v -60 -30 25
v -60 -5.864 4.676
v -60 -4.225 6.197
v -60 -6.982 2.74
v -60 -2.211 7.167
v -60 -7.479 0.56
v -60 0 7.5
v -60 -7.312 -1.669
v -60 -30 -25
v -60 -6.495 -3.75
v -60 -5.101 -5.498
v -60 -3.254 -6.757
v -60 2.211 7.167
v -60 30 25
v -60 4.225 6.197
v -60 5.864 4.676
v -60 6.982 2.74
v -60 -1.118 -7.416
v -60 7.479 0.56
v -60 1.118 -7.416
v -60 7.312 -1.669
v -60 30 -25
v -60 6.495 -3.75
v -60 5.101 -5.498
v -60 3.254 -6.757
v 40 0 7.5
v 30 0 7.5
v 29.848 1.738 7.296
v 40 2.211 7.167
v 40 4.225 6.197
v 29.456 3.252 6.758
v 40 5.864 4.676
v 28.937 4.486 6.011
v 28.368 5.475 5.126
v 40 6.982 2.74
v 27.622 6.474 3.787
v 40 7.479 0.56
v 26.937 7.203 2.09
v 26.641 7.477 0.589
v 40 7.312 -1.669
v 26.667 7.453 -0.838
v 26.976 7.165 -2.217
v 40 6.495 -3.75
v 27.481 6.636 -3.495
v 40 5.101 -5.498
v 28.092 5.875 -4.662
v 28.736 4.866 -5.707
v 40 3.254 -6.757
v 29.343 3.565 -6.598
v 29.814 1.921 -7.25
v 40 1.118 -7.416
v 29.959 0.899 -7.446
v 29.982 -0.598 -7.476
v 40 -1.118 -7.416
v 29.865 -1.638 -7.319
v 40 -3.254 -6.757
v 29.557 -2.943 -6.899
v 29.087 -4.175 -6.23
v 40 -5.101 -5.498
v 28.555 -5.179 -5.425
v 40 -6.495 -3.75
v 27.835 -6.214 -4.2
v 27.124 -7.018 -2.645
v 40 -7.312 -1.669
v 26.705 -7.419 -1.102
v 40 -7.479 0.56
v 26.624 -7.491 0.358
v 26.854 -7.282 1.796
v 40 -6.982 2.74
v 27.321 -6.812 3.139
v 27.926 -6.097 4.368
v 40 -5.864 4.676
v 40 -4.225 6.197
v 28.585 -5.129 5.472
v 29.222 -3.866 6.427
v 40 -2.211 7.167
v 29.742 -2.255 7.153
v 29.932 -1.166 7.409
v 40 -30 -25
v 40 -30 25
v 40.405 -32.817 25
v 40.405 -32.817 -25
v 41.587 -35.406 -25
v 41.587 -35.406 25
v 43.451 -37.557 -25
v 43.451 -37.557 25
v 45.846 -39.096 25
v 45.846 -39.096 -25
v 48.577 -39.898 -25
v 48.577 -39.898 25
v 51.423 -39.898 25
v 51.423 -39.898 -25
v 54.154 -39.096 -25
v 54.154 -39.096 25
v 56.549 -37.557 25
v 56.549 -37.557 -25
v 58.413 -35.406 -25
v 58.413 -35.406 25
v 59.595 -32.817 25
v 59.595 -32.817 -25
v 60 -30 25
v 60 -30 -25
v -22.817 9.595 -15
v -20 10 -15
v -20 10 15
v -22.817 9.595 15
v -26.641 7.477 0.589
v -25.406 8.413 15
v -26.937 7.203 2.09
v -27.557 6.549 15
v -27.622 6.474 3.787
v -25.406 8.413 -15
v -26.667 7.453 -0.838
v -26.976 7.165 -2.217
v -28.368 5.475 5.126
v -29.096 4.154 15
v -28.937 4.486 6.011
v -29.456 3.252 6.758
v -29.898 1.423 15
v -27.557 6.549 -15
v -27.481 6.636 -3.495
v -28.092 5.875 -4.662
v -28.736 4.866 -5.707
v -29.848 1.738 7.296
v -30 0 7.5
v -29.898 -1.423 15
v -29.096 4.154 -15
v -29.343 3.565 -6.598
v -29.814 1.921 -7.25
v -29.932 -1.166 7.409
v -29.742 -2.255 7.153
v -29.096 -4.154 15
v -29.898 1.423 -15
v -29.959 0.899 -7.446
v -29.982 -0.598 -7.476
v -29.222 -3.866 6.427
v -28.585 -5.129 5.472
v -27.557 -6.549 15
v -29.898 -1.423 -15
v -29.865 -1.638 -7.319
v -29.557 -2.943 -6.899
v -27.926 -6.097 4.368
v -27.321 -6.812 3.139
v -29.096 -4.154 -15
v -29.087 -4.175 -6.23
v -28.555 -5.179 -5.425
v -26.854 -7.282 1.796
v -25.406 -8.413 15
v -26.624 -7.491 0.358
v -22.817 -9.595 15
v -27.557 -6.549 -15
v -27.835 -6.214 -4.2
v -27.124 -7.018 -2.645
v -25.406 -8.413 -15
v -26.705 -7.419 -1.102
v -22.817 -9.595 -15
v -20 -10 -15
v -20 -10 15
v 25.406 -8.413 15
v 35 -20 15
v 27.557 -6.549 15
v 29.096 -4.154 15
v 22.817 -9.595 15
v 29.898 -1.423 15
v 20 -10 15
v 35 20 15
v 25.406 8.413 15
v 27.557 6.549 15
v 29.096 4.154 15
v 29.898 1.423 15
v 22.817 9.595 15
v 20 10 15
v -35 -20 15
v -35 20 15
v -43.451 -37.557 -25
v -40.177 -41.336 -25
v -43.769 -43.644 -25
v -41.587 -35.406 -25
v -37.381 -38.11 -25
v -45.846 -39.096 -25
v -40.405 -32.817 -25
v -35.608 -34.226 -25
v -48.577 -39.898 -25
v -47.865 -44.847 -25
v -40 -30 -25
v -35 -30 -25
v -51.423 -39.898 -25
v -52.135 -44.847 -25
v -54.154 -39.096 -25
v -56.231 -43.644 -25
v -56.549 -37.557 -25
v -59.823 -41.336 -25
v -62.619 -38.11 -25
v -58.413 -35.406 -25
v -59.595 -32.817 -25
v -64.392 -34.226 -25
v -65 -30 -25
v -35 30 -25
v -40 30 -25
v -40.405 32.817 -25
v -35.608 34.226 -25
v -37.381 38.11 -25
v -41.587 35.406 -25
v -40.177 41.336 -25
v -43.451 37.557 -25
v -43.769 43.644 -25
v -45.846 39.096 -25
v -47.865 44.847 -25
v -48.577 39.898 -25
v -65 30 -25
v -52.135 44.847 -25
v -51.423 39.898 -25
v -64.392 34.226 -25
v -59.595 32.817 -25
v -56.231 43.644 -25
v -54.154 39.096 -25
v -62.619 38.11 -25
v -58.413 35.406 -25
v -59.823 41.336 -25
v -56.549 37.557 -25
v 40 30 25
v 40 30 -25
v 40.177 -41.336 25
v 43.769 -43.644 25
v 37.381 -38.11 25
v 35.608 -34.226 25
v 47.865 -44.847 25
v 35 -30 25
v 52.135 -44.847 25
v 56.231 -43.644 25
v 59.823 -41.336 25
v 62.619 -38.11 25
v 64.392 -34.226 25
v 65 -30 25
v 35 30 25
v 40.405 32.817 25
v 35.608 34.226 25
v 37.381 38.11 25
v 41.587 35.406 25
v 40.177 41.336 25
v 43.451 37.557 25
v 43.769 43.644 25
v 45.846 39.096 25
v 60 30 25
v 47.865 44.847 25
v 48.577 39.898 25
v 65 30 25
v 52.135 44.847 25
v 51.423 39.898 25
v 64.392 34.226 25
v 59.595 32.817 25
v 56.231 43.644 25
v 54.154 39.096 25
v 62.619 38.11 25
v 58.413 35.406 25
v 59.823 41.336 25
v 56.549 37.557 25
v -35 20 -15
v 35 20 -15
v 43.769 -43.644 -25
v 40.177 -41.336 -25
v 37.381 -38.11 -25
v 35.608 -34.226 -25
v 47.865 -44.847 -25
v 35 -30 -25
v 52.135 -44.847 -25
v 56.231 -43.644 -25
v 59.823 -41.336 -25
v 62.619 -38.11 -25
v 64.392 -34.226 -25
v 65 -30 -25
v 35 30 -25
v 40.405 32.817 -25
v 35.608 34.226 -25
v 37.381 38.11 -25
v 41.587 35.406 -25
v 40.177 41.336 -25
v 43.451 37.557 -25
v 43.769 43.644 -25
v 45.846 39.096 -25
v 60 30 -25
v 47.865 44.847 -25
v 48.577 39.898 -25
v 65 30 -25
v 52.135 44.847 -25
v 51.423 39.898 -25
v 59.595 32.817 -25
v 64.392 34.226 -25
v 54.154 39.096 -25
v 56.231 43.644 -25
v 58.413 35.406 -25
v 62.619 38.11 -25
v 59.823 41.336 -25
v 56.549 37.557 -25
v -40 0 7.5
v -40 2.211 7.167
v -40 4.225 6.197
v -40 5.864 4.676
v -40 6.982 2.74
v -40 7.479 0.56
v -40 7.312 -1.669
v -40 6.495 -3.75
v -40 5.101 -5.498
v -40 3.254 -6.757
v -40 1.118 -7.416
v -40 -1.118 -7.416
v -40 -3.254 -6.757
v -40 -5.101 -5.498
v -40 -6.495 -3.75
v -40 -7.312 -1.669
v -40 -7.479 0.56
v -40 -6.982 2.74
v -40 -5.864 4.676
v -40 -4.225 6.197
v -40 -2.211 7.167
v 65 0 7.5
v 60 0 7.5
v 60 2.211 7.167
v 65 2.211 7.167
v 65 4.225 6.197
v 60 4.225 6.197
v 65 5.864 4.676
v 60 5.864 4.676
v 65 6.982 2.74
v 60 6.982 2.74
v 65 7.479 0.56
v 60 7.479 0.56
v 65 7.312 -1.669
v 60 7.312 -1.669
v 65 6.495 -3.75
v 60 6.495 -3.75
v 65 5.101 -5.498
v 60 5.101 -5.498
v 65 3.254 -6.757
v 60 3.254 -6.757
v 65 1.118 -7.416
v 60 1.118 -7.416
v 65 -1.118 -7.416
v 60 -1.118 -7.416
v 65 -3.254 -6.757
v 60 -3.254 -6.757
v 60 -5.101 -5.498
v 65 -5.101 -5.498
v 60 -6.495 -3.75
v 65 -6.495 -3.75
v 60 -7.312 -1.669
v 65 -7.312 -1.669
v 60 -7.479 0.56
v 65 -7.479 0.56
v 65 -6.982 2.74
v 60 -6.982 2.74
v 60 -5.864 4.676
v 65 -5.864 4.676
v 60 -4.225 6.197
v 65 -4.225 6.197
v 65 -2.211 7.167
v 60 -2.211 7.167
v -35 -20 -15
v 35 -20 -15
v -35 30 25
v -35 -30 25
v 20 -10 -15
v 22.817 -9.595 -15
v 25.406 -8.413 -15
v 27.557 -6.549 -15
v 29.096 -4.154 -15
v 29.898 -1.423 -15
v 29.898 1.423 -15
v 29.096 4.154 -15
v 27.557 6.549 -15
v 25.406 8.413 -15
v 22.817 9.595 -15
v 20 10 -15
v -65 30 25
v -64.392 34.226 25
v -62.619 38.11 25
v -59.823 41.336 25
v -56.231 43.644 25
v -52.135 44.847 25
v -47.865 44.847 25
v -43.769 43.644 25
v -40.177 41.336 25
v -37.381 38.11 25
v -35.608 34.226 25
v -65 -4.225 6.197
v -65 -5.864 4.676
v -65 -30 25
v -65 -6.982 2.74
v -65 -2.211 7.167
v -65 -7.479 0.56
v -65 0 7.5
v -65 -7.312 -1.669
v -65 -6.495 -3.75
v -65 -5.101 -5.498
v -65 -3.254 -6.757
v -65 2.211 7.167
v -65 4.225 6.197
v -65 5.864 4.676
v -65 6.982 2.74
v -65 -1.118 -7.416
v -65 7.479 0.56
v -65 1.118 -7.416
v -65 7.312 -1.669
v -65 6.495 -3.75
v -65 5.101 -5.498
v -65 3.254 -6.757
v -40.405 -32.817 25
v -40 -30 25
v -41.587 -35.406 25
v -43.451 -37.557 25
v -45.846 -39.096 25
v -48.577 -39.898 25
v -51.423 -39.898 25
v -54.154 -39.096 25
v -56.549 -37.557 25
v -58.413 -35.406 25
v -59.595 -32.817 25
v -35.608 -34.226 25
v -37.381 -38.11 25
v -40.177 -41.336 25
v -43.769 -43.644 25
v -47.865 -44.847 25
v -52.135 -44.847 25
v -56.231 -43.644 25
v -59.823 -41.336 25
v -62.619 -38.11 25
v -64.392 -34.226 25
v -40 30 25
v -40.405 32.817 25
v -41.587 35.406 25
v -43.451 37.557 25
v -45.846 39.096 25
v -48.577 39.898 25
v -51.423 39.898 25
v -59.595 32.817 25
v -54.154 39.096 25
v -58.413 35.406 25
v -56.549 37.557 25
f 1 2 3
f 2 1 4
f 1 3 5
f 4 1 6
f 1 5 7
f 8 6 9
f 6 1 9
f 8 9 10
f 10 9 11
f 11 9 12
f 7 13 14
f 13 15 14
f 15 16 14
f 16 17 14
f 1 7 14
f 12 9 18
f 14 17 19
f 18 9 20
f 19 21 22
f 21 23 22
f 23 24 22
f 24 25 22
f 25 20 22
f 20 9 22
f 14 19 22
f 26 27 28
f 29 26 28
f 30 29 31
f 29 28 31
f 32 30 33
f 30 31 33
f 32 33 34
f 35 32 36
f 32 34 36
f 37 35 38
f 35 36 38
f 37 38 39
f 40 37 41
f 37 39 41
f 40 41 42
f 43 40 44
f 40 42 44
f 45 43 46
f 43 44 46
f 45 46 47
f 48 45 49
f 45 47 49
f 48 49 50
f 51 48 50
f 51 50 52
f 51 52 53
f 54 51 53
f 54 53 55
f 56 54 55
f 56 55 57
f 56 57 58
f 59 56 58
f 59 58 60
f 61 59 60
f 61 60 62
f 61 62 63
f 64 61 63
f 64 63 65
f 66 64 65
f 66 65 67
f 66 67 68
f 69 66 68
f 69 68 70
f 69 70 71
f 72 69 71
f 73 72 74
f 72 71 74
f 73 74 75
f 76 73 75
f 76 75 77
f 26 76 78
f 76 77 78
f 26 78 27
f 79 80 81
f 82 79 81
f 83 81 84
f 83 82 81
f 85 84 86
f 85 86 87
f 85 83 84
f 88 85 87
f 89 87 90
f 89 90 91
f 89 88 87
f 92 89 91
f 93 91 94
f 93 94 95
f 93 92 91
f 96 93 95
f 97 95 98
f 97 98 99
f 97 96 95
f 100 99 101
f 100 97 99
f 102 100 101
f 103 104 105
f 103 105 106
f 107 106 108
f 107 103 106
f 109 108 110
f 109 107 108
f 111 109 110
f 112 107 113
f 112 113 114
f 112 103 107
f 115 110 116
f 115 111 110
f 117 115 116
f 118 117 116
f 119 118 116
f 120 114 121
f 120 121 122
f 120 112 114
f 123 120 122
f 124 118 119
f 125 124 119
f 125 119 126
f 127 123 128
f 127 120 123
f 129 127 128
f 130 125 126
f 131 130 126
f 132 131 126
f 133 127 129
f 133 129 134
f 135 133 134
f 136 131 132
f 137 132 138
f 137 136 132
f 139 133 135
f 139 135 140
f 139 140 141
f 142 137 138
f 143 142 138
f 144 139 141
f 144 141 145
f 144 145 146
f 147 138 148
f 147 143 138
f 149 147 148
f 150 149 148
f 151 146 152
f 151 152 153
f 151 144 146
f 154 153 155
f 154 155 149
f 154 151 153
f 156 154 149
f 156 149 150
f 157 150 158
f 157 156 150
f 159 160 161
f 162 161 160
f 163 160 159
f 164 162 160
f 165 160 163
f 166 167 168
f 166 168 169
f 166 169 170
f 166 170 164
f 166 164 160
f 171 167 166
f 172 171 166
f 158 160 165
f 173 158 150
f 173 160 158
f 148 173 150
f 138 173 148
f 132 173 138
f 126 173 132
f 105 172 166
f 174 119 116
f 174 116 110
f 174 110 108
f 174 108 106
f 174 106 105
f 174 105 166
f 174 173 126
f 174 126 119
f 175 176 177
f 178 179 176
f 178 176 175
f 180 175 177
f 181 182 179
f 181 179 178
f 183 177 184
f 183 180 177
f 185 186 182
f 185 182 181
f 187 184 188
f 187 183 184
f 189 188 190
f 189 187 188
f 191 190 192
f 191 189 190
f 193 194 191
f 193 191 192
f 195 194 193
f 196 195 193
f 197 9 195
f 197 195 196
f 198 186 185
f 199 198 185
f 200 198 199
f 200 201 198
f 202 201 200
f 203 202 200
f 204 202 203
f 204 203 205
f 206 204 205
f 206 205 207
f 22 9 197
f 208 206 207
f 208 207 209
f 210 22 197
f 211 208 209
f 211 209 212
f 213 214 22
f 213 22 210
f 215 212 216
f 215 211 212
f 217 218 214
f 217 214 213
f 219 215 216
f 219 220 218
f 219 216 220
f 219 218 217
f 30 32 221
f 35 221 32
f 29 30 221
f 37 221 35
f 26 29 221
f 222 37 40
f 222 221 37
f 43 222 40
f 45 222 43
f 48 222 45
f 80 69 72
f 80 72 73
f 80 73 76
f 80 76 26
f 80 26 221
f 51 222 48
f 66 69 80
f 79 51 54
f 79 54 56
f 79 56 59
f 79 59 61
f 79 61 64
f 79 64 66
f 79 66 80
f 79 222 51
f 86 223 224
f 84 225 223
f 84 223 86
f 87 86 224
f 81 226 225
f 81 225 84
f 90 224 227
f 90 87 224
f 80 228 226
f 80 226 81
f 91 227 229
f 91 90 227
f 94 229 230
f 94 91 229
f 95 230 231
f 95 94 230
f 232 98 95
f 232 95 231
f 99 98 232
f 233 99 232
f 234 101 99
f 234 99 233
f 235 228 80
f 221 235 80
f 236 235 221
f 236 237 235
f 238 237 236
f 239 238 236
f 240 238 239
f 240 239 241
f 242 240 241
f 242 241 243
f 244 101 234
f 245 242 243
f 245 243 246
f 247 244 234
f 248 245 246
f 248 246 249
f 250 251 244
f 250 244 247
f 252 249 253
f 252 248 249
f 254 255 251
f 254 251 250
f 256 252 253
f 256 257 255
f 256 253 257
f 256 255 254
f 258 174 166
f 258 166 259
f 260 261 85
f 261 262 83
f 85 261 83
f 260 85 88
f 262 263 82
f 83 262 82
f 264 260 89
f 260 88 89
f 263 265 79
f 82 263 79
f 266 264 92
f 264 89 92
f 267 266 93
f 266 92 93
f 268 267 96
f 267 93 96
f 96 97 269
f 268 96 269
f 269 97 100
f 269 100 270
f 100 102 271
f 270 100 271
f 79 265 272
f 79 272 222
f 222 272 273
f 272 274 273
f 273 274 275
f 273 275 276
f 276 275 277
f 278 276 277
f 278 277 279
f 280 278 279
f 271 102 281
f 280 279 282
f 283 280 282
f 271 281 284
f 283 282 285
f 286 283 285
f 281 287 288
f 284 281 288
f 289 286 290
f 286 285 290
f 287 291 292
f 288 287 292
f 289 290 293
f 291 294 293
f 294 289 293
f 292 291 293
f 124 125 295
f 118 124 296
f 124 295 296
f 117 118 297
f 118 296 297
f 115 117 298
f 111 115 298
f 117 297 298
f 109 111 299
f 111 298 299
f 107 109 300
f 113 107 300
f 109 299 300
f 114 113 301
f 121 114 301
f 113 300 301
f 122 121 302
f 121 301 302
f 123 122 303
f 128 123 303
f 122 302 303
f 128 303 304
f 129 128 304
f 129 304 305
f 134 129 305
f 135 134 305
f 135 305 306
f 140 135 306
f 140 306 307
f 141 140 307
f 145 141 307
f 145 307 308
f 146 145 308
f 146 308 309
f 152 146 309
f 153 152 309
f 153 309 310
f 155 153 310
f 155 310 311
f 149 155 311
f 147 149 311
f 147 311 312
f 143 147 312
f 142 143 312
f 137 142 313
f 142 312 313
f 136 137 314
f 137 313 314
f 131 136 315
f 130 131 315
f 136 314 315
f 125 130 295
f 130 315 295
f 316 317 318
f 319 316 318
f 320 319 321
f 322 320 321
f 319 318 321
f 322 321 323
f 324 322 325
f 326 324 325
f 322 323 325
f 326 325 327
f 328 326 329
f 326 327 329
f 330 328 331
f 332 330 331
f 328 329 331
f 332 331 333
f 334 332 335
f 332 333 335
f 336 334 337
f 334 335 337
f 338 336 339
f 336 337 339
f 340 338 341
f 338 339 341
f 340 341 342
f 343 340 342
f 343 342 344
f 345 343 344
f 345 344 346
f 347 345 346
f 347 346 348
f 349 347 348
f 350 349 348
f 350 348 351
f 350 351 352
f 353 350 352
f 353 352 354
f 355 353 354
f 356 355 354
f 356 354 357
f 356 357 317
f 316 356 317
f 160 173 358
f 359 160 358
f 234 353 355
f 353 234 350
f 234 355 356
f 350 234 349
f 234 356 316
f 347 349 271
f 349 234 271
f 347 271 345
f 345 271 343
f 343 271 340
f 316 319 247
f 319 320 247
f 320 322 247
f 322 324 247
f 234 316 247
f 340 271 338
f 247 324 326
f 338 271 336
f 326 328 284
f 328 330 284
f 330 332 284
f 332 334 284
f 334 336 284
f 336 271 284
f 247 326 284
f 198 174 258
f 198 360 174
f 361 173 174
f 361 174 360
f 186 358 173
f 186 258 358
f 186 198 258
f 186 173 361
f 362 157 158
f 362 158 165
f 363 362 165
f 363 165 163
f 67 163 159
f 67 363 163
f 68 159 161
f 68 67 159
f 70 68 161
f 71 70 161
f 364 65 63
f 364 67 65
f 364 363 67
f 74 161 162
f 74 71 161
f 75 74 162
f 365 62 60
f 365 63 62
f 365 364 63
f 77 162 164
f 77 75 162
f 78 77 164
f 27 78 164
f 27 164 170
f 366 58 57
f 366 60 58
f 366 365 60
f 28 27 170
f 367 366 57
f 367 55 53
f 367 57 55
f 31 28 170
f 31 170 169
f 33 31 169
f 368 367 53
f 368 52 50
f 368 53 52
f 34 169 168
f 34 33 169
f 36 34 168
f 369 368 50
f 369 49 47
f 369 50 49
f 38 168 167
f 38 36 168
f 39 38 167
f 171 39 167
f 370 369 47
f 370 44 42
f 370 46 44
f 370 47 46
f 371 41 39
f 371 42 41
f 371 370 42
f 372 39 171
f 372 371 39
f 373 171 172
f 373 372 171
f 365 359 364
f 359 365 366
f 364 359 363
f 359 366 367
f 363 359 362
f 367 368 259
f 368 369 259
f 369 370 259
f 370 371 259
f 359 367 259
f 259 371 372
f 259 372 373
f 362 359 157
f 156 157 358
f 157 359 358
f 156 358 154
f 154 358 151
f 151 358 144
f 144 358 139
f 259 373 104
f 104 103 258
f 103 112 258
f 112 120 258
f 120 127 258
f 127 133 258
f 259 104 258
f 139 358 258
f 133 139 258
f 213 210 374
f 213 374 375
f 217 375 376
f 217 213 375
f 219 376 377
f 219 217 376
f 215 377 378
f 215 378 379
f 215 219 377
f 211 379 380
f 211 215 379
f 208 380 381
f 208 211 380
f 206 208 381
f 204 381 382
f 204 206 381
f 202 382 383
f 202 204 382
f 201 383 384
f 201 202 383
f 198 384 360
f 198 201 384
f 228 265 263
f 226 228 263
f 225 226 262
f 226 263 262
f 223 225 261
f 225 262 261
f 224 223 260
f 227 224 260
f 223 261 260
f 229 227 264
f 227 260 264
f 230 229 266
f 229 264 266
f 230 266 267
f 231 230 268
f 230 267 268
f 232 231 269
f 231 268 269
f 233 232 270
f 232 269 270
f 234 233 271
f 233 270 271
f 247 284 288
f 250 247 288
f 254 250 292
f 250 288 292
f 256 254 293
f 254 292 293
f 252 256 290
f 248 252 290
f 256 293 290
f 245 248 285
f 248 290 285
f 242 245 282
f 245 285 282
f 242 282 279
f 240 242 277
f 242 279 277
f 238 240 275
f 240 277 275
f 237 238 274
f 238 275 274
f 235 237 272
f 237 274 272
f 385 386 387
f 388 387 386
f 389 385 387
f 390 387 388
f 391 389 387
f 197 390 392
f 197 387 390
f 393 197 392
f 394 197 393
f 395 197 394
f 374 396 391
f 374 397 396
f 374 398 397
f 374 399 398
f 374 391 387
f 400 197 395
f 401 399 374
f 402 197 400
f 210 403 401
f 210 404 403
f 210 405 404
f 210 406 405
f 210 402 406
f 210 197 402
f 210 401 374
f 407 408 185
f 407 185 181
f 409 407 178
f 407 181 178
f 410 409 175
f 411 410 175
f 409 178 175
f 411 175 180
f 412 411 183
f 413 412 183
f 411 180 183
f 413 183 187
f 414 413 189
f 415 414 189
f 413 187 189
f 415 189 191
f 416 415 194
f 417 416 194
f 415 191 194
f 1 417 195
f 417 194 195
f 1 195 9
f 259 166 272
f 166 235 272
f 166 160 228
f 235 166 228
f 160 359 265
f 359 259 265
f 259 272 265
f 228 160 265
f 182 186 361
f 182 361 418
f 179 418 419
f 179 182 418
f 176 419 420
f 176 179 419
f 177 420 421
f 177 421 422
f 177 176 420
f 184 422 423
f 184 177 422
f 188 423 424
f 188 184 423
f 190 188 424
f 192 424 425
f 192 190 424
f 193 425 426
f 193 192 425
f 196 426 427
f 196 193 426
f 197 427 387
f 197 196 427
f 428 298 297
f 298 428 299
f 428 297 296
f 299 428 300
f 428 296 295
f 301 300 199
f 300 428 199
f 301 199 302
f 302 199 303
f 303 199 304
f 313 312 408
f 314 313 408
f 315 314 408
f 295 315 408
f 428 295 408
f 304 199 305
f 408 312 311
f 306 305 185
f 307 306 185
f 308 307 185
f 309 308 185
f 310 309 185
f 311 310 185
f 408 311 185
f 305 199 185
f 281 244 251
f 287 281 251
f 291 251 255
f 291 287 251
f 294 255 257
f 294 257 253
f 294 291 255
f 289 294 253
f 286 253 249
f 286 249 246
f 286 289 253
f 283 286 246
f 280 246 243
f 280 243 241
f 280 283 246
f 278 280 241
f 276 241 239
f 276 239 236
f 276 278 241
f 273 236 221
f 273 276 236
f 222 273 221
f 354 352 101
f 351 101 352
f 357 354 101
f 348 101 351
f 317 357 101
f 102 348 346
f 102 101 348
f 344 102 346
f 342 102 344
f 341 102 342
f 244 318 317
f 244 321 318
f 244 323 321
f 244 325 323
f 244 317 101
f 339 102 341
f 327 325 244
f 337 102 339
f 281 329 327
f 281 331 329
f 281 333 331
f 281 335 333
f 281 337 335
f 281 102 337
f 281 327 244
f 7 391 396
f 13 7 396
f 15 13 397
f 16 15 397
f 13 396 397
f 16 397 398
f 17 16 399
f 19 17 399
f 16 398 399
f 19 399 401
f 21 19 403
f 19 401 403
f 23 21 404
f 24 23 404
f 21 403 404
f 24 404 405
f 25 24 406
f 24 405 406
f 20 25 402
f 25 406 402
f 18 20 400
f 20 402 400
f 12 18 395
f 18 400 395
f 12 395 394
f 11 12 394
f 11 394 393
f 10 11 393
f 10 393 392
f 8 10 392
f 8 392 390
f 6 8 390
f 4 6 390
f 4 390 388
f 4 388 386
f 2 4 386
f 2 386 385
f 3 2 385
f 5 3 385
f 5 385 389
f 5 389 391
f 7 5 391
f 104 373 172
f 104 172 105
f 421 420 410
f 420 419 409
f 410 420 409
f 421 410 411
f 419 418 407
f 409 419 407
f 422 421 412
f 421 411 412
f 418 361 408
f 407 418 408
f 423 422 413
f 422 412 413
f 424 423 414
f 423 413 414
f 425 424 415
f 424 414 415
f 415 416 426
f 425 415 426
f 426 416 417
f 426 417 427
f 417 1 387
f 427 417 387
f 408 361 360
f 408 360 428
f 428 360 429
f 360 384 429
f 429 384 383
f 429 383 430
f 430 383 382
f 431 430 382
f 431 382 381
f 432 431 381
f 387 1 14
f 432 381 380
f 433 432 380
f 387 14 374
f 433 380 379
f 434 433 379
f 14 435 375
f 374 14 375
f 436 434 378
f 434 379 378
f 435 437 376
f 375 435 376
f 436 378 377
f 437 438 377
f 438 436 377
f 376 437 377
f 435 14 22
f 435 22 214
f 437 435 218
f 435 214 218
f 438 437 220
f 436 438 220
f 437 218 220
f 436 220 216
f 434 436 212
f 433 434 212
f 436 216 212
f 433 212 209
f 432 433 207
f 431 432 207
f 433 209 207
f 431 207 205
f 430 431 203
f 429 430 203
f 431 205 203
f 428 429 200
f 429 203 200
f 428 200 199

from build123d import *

# Parameters (mm, degrees)
BOSS_EXTRUDE1_DEPTH        = 25
BOSS_EXTRUDE1_DEPTH_BACK   = 25
BOSS_EXTRUDE1_2_DEPTH      = 25
BOSS_EXTRUDE1_2_DEPTH_BACK = 25
BOSS_EXTRUDE2_REACH        = 114.472
SKETCH3_W                  = 30
SKETCH3_H                  = 40
CUT_EXTRUDE1_DEPTH         = 89.600225733
HOLE1_D                    = 15


with BuildPart() as part:
    # Sketch1 → Boss-Extrude1 (new, two sides: drawn at the far end of the back side and taken through both)
    with BuildSketch(Plane.XY.offset(-BOSS_EXTRUDE1_DEPTH_BACK)):
        with BuildLine():
            Line((-35, 30), (-35, -30))
            ThreePointArc((-35, -30), (-50, -45), (-65, -30))
            Line((-65, -30), (-65, 30))
            ThreePointArc((-65, 30), (-50, 45), (-35, 30))
        make_face()
        with BuildLine():
            Line((-40, 30), (-40, -30))
            ThreePointArc((-40, -30), (-50, -40), (-60, -30))
            Line((-60, -30), (-60, 30))
            ThreePointArc((-60, 30), (-50, 40), (-40, 30))
        make_face(mode=Mode.SUBTRACT)
    extrude(amount=BOSS_EXTRUDE1_DEPTH + BOSS_EXTRUDE1_DEPTH_BACK)


with BuildPart() as body_2:
    # Sketch1 → Boss-Extrude1 2 (new, two sides: drawn at the far end of the back side and taken through both)
    with BuildSketch(Plane.XY.offset(-BOSS_EXTRUDE1_2_DEPTH_BACK)):
        with BuildLine():
            Line((35, 30), (35, -30))
            ThreePointArc((35, -30), (50, -45), (65, -30))
            Line((65, -30), (65, 30))
            ThreePointArc((65, 30), (50, 45), (35, 30))
        make_face()
        with BuildLine():
            Line((40, 30), (40, -30))
            ThreePointArc((40, -30), (50, -40), (60, -30))
            Line((60, -30), (60, 30))
            ThreePointArc((60, 30), (50, 40), (40, 30))
        make_face(mode=Mode.SUBTRACT)
    extrude(amount=BOSS_EXTRUDE1_2_DEPTH + BOSS_EXTRUDE1_2_DEPTH_BACK)

    # Sketch3 → Boss-Extrude2 (add, up to next)
    with BuildSketch(Plane(origin=(-35, 0, 0), x_dir=(0, 0, -1), z_dir=(1, 0, 0)), mode=Mode.PRIVATE) as boss_extrude2_sk1:
        Rectangle(SKETCH3_W, SKETCH3_H)
    boss_extrude2_tool1 = extrude(boss_extrude2_sk1.sketch, amount=BOSS_EXTRUDE2_REACH, mode=Mode.PRIVATE) - body_2.part

    add(part.part)  # Boss-Extrude2 merges part
    add(boss_extrude2_tool1.solids().sort_by_distance((-35, 0, 0))[0])

    # Sketch4 → Cut-Extrude1 (cut, through all)
    with BuildSketch(Plane(origin=(0, 0, -15), x_dir=(-1, 0, 0), z_dir=(0, 0, -1))):
        with BuildLine():
            Line((-20, 10), (20, 10))
            ThreePointArc((20, 10), (30, 0), (20, -10))
            Line((20, -10), (-20, -10))
            ThreePointArc((-20, -10), (-30, 0), (-20, 10))
        make_face()
    extrude(amount=-CUT_EXTRUDE1_DEPTH, mode=Mode.SUBTRACT)

    # Hole1 (through all)
    with Locations(Plane(origin=(65, 0, 0), x_dir=(0, 0, -1), z_dir=(1, 0, 0))):
        with Locations((0, 0)):
            Hole(HOLE1_D / 2)


solid = body_2.part
